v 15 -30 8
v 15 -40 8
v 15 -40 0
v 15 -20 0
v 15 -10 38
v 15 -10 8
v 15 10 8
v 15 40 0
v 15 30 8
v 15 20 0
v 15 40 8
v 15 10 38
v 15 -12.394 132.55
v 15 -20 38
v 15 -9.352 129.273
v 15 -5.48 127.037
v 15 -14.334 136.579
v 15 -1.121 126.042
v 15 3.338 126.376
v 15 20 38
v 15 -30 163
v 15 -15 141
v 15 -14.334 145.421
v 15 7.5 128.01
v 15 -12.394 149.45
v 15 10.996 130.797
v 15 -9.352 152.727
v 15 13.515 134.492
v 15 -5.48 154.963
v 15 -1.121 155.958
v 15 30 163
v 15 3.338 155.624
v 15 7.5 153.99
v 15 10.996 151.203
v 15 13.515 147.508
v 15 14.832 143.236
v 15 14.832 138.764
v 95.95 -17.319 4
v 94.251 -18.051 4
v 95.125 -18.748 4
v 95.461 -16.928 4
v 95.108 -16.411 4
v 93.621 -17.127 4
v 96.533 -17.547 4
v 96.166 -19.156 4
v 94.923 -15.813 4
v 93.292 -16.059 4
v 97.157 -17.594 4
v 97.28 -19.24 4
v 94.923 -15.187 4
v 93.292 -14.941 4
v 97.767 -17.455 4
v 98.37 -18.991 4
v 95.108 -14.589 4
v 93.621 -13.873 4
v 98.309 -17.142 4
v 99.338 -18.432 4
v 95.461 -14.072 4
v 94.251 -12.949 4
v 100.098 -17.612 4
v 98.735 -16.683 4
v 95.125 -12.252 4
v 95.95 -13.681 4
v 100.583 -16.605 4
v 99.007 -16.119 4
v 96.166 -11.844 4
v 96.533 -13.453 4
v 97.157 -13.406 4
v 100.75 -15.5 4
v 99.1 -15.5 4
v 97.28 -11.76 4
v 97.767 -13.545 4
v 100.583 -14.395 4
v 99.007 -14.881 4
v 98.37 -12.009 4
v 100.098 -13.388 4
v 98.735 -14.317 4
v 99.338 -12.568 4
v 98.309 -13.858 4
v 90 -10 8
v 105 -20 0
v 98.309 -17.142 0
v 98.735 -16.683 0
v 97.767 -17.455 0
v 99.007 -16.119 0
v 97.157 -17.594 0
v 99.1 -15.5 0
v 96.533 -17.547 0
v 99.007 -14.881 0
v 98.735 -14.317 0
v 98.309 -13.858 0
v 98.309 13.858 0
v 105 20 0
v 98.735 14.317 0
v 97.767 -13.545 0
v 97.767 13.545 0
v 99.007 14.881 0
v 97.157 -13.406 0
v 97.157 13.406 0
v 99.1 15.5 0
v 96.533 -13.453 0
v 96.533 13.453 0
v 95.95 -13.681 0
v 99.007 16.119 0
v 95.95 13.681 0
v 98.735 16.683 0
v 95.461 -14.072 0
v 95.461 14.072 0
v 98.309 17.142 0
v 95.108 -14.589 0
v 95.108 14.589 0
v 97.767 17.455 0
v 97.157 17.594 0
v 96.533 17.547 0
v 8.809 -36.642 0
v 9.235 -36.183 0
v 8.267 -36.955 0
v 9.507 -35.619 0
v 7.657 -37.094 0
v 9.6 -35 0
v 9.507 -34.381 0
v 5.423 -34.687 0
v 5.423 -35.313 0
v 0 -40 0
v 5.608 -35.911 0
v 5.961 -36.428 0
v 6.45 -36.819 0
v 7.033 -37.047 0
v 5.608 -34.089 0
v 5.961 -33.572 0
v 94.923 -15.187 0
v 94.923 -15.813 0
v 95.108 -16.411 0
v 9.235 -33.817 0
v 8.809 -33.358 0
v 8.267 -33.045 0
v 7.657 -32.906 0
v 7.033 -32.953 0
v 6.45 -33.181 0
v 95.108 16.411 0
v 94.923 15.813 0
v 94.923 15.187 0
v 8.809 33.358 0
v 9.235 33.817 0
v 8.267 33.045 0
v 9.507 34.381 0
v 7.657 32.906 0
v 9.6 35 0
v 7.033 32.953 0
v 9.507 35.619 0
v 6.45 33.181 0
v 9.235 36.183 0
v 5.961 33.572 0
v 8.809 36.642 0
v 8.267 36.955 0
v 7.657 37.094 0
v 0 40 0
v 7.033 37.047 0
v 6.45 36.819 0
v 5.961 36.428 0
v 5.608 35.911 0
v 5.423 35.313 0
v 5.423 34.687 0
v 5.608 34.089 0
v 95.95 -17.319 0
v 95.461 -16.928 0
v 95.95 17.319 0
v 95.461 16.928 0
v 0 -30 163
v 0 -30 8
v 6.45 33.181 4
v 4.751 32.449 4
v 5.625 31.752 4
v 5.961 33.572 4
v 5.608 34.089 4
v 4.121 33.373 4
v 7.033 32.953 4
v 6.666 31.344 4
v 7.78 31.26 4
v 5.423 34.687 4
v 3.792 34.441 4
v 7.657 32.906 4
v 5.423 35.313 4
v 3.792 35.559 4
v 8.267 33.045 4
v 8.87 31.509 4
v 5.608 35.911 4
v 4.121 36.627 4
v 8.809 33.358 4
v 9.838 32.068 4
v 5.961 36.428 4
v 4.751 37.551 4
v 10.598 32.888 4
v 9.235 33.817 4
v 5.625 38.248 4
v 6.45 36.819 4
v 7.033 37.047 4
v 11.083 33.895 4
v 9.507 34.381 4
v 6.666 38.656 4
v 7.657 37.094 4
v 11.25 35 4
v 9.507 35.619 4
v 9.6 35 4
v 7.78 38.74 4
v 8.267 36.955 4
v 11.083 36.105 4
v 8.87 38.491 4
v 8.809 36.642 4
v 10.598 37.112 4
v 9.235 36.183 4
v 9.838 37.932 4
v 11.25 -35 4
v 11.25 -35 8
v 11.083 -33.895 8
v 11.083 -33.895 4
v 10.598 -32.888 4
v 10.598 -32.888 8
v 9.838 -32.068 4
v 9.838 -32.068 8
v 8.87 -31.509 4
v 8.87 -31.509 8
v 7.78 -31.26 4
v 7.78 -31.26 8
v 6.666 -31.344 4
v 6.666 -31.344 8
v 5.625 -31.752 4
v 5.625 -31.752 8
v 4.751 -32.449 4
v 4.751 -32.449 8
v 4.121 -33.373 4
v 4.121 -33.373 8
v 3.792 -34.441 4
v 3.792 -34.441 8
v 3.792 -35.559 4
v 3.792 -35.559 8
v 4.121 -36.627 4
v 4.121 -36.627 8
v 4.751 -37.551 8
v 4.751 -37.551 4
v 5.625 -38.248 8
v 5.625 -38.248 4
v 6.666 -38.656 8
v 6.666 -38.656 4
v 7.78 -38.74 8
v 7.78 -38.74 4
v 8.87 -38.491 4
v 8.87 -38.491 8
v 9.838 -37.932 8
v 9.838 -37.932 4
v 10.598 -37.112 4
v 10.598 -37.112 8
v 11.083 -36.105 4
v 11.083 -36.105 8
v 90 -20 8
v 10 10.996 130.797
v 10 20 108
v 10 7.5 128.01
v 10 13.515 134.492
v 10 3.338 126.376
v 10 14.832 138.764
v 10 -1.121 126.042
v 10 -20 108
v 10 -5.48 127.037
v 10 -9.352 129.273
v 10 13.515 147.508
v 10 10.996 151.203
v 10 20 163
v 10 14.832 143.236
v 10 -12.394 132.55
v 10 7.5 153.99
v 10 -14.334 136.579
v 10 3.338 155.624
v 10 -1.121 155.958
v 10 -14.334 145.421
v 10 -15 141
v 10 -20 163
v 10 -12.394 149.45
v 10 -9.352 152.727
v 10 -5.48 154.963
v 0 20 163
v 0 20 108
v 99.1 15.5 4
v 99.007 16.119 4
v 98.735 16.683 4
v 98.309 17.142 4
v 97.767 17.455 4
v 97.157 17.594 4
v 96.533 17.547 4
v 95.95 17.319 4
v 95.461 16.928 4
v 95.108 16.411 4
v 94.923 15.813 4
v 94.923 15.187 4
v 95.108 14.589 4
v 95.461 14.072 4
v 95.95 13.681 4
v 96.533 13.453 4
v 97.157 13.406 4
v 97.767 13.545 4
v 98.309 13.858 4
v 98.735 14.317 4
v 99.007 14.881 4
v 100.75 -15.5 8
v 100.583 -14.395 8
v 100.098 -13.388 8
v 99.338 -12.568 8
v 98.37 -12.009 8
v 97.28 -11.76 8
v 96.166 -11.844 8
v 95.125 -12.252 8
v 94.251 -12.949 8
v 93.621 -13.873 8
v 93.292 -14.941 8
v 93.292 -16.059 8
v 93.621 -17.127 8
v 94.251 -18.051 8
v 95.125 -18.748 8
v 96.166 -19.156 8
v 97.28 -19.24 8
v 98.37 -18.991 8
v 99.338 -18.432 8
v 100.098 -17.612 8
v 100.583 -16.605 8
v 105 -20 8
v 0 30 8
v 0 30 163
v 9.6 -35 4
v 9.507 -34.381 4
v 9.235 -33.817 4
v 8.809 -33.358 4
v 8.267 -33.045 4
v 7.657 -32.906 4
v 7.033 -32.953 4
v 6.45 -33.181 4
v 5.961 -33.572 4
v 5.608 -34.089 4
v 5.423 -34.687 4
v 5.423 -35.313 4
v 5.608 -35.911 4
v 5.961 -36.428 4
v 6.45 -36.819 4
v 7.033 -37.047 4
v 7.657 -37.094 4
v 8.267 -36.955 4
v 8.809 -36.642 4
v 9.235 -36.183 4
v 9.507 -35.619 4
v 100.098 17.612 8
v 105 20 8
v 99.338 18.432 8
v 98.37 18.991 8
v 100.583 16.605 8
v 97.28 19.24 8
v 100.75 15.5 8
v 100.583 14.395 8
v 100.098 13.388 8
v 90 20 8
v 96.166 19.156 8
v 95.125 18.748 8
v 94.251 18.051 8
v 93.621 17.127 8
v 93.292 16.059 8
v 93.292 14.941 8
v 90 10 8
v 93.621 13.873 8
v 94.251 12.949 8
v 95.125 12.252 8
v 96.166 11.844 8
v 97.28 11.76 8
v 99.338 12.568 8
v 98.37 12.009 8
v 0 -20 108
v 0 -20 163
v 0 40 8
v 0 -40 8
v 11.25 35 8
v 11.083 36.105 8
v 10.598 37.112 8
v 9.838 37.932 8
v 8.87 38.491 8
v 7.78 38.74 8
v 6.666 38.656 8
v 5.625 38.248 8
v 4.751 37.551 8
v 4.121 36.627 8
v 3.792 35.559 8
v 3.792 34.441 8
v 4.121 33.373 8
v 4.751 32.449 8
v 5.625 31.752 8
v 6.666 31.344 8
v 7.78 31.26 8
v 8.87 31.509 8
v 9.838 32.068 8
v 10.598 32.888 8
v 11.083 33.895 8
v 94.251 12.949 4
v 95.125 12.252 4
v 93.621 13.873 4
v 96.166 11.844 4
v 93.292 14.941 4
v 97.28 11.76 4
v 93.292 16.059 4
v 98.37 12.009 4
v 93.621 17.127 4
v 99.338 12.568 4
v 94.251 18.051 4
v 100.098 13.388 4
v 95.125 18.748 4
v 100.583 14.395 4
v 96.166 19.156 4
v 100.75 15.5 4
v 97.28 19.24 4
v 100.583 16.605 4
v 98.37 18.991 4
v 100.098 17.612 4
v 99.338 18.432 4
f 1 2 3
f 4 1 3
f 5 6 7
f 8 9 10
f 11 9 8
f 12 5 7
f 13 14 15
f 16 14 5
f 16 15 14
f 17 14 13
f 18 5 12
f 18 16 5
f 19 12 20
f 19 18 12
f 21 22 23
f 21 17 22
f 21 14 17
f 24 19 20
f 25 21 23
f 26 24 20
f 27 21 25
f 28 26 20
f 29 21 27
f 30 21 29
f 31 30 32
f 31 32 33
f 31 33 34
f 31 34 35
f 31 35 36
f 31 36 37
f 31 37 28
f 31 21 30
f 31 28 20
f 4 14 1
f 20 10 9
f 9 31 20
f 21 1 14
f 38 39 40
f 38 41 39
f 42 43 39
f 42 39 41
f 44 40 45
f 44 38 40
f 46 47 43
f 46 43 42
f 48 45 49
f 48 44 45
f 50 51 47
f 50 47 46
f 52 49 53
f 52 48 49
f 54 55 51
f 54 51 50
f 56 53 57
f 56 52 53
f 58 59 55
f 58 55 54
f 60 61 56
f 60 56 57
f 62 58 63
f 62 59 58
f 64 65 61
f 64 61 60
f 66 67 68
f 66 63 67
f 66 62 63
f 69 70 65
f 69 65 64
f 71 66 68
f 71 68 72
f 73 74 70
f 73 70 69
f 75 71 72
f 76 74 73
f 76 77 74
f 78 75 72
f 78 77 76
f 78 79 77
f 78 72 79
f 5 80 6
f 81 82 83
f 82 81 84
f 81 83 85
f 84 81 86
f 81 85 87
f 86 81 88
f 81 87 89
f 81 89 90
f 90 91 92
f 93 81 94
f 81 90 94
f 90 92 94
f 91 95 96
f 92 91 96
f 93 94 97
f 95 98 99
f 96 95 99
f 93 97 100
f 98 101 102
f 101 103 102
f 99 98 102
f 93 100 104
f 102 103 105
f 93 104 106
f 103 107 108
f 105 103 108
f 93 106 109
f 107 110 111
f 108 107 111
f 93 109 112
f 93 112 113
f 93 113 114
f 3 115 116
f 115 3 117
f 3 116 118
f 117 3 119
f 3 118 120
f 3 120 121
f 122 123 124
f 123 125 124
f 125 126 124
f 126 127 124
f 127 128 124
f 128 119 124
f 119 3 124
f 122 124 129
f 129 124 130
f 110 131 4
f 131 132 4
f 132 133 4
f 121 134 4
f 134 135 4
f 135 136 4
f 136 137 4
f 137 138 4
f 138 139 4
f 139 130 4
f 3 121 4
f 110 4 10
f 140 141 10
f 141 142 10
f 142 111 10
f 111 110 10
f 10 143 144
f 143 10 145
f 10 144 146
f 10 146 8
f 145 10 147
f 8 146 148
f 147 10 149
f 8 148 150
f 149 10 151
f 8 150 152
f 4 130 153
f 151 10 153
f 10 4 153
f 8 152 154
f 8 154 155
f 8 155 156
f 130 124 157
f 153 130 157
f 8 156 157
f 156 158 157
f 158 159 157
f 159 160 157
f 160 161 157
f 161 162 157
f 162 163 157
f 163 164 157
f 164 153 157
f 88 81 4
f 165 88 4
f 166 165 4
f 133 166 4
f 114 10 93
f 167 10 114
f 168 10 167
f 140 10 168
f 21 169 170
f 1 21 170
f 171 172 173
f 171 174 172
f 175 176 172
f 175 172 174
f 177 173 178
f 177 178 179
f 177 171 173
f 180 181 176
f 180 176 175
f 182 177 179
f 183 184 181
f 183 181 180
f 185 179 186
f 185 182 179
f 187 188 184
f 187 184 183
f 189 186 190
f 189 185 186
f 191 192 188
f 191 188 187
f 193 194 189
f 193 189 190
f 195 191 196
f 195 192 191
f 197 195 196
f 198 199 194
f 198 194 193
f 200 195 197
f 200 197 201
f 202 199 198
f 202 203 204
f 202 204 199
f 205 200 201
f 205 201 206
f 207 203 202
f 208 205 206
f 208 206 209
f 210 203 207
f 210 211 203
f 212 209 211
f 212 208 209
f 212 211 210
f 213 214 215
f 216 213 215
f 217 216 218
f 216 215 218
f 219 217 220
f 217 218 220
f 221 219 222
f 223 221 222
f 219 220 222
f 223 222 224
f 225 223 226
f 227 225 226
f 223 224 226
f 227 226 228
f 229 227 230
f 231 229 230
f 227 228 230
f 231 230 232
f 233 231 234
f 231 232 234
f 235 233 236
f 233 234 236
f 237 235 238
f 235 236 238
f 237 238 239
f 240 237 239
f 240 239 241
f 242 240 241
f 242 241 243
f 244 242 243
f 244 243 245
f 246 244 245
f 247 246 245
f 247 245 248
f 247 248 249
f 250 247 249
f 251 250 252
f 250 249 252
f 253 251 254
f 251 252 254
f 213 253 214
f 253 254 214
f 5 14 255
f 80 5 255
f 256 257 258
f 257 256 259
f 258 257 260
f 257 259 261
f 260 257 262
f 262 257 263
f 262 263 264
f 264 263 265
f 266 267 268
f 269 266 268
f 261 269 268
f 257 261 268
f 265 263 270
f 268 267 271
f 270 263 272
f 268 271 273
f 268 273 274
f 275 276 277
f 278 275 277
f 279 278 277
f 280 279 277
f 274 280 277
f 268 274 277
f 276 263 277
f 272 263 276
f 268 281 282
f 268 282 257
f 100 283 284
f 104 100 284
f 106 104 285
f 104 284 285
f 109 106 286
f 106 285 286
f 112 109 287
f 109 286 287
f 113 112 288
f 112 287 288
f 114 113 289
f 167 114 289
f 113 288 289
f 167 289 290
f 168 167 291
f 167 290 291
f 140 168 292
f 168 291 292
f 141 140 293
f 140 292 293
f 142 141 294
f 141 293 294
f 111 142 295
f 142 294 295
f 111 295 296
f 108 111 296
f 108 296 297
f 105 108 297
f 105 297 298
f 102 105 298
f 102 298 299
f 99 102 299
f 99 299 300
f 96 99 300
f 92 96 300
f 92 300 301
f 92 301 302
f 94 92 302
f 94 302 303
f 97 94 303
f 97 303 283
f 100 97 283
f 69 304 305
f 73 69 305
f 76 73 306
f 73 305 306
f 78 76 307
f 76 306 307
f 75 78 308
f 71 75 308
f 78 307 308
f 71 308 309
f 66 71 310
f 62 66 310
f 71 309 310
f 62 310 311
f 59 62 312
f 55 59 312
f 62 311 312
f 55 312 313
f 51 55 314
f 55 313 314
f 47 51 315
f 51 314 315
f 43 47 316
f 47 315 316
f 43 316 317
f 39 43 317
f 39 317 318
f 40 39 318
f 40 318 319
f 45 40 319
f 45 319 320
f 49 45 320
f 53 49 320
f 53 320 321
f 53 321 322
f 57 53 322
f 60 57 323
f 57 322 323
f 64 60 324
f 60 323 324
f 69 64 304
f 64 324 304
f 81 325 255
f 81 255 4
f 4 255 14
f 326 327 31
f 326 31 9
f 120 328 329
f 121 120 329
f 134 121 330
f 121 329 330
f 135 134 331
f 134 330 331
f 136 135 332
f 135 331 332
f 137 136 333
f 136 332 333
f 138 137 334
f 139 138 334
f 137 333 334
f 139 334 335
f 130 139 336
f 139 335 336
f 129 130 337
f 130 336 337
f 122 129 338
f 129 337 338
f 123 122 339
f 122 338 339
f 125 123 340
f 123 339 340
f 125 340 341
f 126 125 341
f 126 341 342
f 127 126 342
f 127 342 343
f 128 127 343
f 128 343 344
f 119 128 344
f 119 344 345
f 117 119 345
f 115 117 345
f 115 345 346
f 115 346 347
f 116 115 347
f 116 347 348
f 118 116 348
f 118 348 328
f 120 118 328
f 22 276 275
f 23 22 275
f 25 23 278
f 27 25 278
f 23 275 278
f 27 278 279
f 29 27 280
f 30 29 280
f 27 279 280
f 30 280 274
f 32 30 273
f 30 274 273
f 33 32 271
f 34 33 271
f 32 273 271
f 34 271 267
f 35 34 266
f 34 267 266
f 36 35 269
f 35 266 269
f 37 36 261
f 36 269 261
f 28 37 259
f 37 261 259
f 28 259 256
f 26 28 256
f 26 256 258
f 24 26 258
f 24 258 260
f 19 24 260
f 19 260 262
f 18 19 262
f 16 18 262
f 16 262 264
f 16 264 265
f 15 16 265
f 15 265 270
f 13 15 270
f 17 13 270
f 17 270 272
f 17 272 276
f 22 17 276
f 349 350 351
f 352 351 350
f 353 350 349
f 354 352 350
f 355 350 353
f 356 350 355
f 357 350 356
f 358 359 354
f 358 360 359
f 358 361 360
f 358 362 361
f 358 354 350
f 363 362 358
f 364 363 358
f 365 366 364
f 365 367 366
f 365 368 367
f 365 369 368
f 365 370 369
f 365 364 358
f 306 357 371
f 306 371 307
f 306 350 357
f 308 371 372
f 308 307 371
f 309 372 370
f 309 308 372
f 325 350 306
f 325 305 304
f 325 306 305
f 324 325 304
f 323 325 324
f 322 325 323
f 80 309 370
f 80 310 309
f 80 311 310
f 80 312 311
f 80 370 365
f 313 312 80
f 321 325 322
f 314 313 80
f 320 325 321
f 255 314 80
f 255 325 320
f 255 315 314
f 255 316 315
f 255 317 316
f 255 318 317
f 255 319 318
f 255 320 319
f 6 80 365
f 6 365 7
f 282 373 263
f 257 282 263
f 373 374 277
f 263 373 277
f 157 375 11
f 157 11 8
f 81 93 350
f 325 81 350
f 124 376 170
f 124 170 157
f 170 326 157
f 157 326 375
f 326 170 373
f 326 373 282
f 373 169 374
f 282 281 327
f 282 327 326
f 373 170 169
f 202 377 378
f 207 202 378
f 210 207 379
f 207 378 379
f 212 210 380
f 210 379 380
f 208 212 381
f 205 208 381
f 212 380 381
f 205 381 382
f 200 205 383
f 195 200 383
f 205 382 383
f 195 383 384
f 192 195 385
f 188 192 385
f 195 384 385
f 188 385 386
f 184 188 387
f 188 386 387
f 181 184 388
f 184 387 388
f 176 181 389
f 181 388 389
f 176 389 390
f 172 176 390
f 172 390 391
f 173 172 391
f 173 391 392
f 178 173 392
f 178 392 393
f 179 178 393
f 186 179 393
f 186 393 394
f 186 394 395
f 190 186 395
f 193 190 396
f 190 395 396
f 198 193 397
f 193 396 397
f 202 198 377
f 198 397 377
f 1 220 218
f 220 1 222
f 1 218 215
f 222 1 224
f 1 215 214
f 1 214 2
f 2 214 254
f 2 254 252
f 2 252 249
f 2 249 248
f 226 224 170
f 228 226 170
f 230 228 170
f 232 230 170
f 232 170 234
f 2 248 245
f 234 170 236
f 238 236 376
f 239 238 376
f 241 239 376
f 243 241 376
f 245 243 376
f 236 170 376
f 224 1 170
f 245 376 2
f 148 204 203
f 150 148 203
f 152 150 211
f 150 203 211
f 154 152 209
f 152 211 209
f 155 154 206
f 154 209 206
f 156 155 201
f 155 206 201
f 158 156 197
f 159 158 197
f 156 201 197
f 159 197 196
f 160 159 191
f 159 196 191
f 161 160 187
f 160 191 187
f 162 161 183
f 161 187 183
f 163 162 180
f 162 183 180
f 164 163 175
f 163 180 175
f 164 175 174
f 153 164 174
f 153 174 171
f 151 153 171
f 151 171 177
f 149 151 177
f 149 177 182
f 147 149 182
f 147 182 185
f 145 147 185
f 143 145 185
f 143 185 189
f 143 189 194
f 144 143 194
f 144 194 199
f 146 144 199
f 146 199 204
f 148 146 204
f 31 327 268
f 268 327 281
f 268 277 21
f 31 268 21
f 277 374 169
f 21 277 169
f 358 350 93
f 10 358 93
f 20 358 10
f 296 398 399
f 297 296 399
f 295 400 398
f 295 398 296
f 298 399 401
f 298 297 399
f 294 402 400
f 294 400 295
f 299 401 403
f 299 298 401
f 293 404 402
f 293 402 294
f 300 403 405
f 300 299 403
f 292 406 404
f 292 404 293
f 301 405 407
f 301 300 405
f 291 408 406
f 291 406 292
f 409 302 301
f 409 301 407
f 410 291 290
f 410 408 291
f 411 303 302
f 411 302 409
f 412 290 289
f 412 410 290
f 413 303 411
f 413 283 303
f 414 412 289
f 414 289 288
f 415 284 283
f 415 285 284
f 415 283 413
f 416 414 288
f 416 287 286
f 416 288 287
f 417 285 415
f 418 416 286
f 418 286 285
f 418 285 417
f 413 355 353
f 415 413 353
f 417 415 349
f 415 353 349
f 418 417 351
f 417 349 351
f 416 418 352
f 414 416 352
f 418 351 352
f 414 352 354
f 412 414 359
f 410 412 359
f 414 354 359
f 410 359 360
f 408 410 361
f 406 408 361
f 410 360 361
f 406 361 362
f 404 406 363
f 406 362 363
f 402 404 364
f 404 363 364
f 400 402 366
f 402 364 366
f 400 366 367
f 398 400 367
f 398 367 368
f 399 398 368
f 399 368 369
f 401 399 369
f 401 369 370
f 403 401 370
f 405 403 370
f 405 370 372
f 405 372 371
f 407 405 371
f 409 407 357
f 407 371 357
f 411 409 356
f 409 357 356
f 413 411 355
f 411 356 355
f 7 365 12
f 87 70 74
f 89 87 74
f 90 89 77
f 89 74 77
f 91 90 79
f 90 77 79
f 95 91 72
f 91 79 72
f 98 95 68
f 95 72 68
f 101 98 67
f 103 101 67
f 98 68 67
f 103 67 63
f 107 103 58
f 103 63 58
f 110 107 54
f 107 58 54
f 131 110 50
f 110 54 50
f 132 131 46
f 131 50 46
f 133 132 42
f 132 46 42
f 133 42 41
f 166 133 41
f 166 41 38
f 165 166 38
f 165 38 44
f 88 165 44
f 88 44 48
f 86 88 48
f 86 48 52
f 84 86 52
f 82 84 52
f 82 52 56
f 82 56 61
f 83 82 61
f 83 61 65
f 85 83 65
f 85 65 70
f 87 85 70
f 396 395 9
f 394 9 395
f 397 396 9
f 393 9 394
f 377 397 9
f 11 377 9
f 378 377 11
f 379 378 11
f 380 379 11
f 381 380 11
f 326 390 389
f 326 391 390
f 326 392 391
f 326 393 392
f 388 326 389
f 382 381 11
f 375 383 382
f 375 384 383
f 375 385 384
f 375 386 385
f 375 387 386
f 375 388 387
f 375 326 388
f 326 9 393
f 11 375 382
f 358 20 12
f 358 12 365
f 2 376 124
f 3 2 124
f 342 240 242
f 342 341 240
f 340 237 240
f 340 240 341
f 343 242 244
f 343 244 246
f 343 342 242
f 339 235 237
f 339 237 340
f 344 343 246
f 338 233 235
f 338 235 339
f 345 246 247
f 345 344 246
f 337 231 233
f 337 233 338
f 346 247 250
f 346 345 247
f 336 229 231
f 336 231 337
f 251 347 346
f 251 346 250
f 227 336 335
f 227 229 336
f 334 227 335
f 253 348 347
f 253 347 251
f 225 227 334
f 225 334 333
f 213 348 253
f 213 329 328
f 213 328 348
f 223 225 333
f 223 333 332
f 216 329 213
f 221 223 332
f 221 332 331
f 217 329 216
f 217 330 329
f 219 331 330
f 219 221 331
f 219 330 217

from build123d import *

# Parameters (mm, degrees)
PAD_DEPTH       = 20
PAD001_DEPTH    = 10
PAD002_DEPTH    = 15
SKETCH003_R     = 2.1
POCKET_DEPTH    = 8.001
SKETCH004_R     = 3.75
POCKET001_DEPTH = 4
SKETCH005_W     = 10
SKETCH005_H     = 55
POCKET002_DEPTH = 40
SKETCH006_R     = 15
POCKET003_DEPTH = 95.001


with BuildPart() as part:
    # Sketch → Pad (new body, symmetric)
    with BuildSketch(Plane.XZ):
        Polygon((0, 163), (0, 0), (105, 0), (105, 8), (15, 8), (15, 163), align=None)
    extrude(amount=PAD_DEPTH, both=True)

    # Sketch001 (on Face8 of Pad) → Pad001 (join)
    with BuildSketch(Plane.XZ.offset(20)):
        Polygon((15, 38), (90, 8), (15, 8), align=None)
    pad001 = extrude(amount=-PAD001_DEPTH)

    # Mirrored: Pad001 across XZ
    add(pad001.mirror(Plane.XZ))

    # Sketch002 (on Face1 of Mirrored) → Pad002 (join)
    with BuildSketch(Plane(origin=(0, 0, 0), x_dir=(0, -1, 0), z_dir=(-1, 0, 0))):
        Polygon((-40, 0), (-20, 0), (-20, 163), (-30, 163), (-30, 8), (-40, 8), align=None)
    pad002 = extrude(amount=-PAD002_DEPTH)

    # Mirrored001: Pad002 across Sketch002 V_Axis
    add(pad002.mirror(Plane(origin=(0, 0, 0), x_dir=(-1, 0, 0), z_dir=(0, -1, 0))))

    # Sketch003 (on Face11 of Mirrored001) → Pocket (cut, through all)
    with BuildSketch(Plane.XY.offset(8)):
        with Locations((7.5, 35)):
            Circle(SKETCH003_R)
        with Locations((7.5, -35)):
            Circle(SKETCH003_R)
        with Locations((97, 15.5)):
            Circle(SKETCH003_R)
        with Locations((97, -15.5)):
            Circle(SKETCH003_R)
    extrude(amount=-POCKET_DEPTH, mode=Mode.SUBTRACT)

    # Sketch004 (on Face15 of Pocket) → Pocket001 (cut)
    with BuildSketch(Plane.XY.offset(8)):
        with Locations((7.5, 35)):
            Circle(SKETCH004_R)
        with Locations((97, 15.5)):
            Circle(SKETCH004_R)
        with Locations((97, -15.5)):
            Circle(SKETCH004_R)
        with Locations((7.5, -35)):
            Circle(SKETCH004_R)
    extrude(amount=-POCKET001_DEPTH, mode=Mode.SUBTRACT)

    # Sketch005 (on Face12 of Pocket001) → Pocket002 (cut)
    with BuildSketch(Plane.XZ.offset(20)):
        with Locations((5, 135.5)):
            Rectangle(SKETCH005_W, SKETCH005_H)
    extrude(amount=-POCKET002_DEPTH, mode=Mode.SUBTRACT)

    # Sketch006 (on Face23 of Pocket002) → Pocket003 (cut, through all)
    with BuildSketch(Plane(origin=(10, 0, 0), x_dir=(0, -1, 0), z_dir=(-1, 0, 0))):
        with Locations((0, 141)):
            Circle(SKETCH006_R)
    extrude(amount=-POCKET003_DEPTH, mode=Mode.SUBTRACT)


solid = part.part
